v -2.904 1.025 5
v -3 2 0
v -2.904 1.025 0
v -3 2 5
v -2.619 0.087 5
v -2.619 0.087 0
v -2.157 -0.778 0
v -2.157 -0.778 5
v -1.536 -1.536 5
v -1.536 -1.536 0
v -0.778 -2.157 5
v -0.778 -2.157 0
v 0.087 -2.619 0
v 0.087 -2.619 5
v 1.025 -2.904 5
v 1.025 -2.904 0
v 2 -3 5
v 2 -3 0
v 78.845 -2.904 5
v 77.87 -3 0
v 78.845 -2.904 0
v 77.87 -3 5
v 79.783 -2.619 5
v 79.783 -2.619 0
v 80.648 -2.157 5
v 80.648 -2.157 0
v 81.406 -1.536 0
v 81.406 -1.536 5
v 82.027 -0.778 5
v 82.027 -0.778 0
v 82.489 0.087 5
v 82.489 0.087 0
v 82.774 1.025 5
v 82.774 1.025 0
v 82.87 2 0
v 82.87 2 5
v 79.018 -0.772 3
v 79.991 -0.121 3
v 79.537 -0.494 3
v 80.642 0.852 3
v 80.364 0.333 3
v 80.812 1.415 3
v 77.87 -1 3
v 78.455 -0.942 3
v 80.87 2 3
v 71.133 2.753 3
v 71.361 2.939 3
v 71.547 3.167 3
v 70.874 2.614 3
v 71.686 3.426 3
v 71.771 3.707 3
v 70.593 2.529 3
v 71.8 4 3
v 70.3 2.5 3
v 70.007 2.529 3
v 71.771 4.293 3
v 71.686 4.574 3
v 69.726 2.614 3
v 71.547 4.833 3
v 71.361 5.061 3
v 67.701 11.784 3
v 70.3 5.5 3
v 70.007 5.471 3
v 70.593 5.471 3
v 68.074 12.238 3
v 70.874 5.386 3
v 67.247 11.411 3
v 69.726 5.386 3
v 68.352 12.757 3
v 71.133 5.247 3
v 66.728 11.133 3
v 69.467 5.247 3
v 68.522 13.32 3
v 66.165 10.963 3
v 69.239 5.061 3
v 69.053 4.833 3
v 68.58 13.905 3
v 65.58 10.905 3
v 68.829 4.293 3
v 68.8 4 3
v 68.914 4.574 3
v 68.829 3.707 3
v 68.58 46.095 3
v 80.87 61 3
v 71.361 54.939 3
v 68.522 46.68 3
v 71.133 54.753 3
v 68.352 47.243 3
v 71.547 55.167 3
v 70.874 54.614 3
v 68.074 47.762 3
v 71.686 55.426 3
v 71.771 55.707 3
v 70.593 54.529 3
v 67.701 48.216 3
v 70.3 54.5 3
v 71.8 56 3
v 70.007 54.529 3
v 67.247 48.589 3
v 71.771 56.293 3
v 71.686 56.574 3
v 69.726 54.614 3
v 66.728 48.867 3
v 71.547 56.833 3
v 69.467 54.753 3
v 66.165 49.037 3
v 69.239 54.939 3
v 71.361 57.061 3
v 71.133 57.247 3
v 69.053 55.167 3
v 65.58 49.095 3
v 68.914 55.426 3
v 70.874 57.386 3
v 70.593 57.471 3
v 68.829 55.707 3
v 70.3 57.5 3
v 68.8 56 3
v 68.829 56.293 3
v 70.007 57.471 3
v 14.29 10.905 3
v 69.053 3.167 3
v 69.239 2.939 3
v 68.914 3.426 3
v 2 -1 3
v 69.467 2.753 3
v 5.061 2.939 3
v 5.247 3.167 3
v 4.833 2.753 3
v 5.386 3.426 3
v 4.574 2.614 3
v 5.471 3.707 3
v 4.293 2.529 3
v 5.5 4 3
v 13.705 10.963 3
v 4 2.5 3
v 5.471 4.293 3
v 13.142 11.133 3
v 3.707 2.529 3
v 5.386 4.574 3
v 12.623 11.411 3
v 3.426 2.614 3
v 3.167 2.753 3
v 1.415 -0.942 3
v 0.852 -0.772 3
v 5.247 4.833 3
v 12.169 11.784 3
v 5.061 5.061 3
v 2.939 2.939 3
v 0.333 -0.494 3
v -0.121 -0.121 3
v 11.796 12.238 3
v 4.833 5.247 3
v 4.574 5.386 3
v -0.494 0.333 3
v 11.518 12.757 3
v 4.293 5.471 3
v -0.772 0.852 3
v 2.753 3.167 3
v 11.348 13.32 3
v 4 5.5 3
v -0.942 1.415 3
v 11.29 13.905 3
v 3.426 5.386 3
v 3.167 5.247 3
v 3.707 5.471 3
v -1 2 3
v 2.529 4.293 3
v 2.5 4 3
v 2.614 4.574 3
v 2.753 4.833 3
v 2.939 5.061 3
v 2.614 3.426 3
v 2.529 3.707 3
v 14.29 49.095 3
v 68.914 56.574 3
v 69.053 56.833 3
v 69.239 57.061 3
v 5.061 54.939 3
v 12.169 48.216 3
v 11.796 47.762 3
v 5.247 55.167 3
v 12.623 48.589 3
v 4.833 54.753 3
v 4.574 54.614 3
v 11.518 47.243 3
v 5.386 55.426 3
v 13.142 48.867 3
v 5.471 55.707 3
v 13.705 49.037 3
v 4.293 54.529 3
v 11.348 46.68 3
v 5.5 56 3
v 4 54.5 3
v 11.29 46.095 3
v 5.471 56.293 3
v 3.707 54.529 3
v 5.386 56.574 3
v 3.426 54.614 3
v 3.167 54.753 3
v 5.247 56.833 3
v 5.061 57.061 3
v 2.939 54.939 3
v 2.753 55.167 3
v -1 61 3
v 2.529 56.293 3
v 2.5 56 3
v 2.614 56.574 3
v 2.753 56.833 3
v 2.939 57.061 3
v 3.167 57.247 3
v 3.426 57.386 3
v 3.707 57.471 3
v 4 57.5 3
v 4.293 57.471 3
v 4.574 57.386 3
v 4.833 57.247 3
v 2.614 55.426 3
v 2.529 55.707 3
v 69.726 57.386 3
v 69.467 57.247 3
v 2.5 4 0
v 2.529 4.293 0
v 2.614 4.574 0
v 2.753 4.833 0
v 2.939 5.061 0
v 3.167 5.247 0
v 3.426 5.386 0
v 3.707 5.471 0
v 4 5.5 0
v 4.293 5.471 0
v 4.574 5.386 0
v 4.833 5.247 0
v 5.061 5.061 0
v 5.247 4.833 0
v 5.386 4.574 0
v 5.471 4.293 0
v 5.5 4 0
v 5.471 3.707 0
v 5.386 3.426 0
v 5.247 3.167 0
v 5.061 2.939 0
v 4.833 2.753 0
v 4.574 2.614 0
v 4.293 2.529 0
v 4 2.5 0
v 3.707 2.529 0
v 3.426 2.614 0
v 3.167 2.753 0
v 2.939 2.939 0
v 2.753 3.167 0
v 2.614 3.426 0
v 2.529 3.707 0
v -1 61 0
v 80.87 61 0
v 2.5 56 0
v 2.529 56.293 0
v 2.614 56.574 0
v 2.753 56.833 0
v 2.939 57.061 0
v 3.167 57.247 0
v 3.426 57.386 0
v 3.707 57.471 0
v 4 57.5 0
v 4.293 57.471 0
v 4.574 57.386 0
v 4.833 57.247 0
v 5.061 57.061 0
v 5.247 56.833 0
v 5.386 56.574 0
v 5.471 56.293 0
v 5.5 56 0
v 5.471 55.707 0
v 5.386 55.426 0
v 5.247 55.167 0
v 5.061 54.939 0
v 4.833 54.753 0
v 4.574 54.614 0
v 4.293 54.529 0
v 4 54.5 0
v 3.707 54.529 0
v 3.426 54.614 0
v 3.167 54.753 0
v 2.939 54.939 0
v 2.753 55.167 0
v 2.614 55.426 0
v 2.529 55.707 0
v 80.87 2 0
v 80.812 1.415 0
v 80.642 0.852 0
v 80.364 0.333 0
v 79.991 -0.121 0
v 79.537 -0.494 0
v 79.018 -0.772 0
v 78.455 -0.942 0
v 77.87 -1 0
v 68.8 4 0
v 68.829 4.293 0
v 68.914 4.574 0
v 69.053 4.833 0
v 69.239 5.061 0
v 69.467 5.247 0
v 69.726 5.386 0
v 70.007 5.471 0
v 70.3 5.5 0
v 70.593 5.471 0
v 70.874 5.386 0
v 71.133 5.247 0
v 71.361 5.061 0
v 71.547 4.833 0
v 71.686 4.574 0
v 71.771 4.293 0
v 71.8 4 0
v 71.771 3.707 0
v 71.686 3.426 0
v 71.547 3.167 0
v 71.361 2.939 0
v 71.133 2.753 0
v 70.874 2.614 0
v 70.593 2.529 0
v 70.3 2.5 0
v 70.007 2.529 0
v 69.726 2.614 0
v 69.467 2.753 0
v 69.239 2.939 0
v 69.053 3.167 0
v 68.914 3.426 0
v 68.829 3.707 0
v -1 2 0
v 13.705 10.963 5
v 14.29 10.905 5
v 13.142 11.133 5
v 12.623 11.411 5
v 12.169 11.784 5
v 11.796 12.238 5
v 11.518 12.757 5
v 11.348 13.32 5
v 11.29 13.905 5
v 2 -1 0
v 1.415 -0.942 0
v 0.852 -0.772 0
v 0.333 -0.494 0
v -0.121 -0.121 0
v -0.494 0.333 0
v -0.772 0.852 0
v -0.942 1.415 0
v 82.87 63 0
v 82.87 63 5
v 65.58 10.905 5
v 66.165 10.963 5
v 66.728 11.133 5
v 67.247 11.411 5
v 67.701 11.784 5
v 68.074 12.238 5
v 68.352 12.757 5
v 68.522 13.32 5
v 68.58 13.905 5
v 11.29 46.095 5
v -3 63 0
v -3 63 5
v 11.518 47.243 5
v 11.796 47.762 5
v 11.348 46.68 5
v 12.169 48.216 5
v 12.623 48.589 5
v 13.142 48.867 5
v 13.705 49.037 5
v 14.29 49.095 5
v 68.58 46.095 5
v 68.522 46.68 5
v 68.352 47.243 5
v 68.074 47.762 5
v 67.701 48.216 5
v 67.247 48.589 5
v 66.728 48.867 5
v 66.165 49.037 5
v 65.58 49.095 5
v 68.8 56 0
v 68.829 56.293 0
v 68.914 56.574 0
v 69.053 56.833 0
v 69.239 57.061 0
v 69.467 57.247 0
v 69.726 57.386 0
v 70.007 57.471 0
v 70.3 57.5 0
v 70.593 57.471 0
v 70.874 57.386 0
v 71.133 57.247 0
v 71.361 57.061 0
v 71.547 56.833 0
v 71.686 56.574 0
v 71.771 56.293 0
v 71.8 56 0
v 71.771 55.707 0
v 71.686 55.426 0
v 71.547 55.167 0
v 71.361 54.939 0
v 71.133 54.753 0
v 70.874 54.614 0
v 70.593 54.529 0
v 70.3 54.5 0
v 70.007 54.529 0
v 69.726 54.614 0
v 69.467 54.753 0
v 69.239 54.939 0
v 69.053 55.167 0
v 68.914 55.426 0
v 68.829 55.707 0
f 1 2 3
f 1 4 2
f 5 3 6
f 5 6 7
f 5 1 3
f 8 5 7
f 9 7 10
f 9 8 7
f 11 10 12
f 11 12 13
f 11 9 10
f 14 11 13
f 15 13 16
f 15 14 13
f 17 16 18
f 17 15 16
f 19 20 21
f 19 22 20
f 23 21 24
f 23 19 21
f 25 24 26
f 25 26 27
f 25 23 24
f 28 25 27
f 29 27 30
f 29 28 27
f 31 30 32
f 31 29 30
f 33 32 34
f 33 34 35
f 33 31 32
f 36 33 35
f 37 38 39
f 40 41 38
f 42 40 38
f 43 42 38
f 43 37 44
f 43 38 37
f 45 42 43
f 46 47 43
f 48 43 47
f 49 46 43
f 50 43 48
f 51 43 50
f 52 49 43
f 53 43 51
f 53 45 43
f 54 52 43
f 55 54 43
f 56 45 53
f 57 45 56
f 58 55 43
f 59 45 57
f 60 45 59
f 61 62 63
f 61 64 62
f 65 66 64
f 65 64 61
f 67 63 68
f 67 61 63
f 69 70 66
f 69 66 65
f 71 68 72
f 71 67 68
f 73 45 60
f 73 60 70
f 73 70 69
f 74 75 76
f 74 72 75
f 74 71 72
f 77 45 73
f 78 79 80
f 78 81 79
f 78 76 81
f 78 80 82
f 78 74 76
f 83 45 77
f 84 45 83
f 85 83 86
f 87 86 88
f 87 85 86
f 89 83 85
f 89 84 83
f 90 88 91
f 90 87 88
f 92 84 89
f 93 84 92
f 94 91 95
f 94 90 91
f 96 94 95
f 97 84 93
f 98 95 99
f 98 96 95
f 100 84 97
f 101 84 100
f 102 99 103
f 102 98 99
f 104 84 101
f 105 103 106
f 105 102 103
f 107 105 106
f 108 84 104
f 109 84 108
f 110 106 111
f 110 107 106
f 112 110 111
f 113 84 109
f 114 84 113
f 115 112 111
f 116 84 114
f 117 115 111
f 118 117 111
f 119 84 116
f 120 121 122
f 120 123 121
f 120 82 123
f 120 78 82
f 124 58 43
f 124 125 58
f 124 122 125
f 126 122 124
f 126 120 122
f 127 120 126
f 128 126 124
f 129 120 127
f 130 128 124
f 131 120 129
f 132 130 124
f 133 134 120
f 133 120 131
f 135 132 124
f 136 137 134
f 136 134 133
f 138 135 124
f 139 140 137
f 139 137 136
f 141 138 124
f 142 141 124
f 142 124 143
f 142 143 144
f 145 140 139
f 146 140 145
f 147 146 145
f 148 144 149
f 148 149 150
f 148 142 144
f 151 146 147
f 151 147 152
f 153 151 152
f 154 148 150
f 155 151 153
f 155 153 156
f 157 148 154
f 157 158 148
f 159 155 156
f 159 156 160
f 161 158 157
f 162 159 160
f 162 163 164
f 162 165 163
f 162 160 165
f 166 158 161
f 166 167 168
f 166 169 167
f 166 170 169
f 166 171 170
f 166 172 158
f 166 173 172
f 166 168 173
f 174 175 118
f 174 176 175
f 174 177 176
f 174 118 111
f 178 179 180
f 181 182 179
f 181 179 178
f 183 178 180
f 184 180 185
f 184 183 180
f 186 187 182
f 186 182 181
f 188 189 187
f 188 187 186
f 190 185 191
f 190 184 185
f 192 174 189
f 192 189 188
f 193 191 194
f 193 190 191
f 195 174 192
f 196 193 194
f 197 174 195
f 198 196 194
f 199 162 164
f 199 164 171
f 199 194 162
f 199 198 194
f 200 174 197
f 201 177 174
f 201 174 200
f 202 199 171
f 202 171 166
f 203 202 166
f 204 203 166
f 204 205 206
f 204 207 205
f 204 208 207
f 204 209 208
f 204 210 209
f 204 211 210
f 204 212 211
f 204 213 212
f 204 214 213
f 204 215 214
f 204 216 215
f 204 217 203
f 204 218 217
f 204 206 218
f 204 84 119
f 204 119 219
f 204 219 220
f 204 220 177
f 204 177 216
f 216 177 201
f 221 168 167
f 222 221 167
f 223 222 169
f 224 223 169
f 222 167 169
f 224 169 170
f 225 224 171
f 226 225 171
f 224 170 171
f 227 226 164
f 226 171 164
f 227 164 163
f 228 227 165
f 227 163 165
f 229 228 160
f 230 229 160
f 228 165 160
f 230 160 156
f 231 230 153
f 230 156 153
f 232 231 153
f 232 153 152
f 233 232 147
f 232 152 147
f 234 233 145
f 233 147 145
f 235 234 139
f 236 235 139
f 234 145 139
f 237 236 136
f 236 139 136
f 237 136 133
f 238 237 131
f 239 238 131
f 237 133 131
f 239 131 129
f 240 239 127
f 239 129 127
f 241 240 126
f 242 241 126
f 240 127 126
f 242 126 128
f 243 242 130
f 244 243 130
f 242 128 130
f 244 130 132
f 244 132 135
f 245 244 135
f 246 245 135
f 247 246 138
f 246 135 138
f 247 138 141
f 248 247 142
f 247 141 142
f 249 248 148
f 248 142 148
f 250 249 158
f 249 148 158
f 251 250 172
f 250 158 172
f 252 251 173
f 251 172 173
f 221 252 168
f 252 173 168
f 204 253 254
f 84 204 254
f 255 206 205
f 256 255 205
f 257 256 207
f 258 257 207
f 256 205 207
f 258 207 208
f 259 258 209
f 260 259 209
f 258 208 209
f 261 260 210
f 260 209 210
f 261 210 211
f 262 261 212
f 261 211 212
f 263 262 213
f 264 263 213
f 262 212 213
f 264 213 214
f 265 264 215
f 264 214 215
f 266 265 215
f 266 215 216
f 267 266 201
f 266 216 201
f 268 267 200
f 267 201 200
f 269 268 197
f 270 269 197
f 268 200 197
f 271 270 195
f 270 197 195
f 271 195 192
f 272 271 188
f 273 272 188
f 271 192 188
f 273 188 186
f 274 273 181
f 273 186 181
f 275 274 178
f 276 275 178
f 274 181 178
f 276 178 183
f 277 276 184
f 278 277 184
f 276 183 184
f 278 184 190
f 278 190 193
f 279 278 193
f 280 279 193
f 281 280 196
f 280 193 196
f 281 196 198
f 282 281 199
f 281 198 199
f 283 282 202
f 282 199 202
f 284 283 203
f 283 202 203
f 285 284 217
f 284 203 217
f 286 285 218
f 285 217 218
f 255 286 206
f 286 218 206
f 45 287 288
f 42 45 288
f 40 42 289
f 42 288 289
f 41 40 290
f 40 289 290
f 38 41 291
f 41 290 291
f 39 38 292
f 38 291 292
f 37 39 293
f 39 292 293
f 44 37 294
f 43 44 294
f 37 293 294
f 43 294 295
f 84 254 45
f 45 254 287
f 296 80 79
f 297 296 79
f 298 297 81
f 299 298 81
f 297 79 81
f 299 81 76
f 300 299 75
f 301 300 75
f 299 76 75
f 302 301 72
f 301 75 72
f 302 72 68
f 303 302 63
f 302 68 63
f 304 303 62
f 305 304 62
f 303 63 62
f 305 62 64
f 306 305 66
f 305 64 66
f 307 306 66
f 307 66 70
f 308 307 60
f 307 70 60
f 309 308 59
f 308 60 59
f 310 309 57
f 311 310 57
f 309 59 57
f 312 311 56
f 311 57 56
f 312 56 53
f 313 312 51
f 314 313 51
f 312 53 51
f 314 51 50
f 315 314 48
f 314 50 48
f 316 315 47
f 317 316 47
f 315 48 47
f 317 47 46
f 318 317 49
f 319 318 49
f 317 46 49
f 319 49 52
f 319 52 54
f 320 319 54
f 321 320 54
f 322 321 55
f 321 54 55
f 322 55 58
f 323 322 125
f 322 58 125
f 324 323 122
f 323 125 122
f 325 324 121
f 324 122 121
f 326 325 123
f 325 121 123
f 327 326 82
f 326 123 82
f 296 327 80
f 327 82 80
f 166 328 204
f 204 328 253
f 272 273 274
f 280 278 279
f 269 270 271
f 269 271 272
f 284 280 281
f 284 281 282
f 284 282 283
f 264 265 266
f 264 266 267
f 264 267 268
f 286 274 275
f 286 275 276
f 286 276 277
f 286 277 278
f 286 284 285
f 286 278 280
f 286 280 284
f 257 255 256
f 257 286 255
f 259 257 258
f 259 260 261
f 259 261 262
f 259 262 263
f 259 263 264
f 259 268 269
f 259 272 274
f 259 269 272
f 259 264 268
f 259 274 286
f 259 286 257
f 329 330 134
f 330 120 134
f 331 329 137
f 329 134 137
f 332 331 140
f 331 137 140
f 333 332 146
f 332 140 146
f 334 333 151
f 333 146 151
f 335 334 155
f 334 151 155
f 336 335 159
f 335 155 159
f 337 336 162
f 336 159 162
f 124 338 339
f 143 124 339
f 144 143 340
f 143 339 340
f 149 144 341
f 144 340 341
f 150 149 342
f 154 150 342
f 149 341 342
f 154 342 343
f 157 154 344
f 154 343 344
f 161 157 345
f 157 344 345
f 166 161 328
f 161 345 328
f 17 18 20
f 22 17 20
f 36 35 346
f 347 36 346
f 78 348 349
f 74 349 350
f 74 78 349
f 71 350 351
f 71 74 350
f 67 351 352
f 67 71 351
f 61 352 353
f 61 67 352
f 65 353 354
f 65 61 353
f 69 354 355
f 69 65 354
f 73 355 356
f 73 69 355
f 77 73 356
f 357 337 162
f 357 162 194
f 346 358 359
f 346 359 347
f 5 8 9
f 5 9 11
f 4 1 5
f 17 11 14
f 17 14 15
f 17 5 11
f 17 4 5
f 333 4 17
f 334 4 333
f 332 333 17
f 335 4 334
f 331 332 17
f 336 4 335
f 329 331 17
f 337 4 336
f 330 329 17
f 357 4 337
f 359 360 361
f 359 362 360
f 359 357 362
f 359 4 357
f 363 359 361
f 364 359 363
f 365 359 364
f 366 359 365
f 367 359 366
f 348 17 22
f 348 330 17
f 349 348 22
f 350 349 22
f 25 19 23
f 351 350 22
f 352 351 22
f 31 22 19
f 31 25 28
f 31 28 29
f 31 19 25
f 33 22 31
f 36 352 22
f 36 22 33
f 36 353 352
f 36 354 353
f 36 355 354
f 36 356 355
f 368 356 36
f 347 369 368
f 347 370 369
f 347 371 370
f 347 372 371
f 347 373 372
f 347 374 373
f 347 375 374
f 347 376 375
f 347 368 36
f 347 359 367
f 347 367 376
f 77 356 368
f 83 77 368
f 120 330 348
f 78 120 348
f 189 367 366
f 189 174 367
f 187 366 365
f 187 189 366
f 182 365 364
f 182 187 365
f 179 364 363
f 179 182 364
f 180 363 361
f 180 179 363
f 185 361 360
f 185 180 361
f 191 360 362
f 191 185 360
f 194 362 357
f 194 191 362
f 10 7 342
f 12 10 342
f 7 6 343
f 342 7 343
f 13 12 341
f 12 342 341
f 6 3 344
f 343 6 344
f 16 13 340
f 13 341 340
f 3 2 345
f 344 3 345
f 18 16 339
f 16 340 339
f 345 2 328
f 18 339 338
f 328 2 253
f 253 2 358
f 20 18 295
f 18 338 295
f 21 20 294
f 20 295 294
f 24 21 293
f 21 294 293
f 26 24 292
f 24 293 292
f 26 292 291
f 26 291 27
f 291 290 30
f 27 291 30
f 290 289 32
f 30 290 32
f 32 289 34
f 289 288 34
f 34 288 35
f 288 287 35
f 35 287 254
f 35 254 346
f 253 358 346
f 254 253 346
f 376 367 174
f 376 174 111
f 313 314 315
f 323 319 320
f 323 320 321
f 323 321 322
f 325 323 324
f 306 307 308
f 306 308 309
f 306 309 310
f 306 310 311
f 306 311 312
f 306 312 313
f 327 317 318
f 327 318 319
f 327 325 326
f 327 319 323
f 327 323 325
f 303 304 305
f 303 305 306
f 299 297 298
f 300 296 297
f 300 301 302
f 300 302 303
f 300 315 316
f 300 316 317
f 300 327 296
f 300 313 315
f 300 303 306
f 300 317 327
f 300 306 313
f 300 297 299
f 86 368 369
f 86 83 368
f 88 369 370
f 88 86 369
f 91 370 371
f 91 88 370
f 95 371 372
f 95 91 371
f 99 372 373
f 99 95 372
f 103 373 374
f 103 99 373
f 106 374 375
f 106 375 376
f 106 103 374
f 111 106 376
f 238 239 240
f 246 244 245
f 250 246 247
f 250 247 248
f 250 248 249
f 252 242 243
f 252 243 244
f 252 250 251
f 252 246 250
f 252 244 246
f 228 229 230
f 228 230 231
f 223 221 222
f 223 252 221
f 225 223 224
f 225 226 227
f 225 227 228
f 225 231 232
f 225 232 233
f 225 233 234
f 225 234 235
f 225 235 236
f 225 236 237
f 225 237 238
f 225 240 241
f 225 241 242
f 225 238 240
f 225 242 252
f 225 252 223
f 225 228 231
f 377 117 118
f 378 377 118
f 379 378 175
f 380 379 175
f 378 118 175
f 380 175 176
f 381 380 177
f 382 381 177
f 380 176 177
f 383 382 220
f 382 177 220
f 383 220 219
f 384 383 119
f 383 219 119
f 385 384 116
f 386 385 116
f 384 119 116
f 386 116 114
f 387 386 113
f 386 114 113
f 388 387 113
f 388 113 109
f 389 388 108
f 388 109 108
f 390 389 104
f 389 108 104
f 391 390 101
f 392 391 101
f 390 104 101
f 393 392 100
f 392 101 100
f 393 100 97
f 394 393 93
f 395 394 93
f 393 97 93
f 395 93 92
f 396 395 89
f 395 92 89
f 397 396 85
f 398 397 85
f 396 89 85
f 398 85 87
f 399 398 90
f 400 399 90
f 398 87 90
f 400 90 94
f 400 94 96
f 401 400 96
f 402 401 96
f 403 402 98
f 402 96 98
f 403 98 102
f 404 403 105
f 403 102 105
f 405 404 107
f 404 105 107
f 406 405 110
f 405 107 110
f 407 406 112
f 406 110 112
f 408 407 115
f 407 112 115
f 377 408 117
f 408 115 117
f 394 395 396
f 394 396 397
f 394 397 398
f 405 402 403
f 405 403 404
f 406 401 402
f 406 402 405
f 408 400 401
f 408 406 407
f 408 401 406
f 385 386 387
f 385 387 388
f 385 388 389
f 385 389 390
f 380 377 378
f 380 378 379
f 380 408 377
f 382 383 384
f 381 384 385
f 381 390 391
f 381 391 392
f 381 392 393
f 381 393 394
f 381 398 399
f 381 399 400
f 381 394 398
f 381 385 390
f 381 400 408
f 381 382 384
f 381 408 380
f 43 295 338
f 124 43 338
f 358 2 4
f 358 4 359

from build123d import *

# Parameters (mm, degrees)
SKETCH1_W           = 85.87
SKETCH1_H           = 66
BOSS_EXTRUDE2_DEPTH = 5
FILLET1_R           = 5
CUT_EXTRUDE2_DEPTH  = 3
CUT_EXTRUDE1_REACH  = 7
SKETCH2_W           = 57.29
SKETCH2_H           = 38.19
FILLET2_R           = 3
SKETCH3_R           = 1.5
BOSS_EXTRUDE3_DEPTH = 3


with BuildPart() as part:
    # Sketch1 → Boss-Extrude2 (new body)
    with BuildSketch(Plane.XY):
        with Locations((39.935, 30)):
            Rectangle(SKETCH1_W, SKETCH1_H)
    extrude(amount=BOSS_EXTRUDE2_DEPTH)

    # Fillet1
    fillet1_edges = [part.edges().sort_by_distance(p)[0] for p in [
        (82.87, -3, 2.5),
        (-3, -3, 2.5),
    ]]
    fillet(fillet1_edges, radius=FILLET1_R)

    # Sketch4 → Cut-Extrude2 (cut)
    with BuildSketch(Plane(origin=(0, 0, 0), x_dir=(-1, 0, 0), z_dir=(0, 0, -1))):
        with BuildLine():
            Line((-80.87, 61), (-80.87, 2))
            ThreePointArc((-80.87, 2), (-79.991320344, -0.121320344), (-77.87, -1))
            Line((-77.87, -1), (-2, -1))
            ThreePointArc((-2, -1), (0.121320344, -0.121320344), (1, 2))
            Line((1, 2), (1, 61))
            Line((1, 61), (-80.87, 61))
        make_face()
    extrude(amount=-CUT_EXTRUDE2_DEPTH, mode=Mode.SUBTRACT)

    # Sketch2 → Cut-Extrude1 (cut, up to next)
    with BuildSketch(Plane.XY.offset(5), mode=Mode.PRIVATE) as cut_extrude1_sk1:
        with Locations((39.935, 30)):
            Rectangle(SKETCH2_W, SKETCH2_H)
    cut_extrude1_tool1 = extrude(cut_extrude1_sk1.sketch, amount=-CUT_EXTRUDE1_REACH, mode=Mode.PRIVATE) & part.part
    add(cut_extrude1_tool1.solids().sort_by_distance((39.935, 30, 5))[0], mode=Mode.SUBTRACT)

    # Fillet2
    fillet2_edges = [part.edges().sort_by_distance(p)[0] for p in [
        (11.29, 10.905, 4),
        (11.29, 49.095, 4),
        (68.58, 49.095, 4),
        (68.58, 10.905, 4),
    ]]
    fillet(fillet2_edges, radius=FILLET2_R)

    # Sketch3 → Boss-Extrude3 (add)
    with BuildSketch(Plane(origin=(0, 0, 3), x_dir=(-1, 0, 0), z_dir=(0, 0, -1))):
        with Locations((-4, 4)):
            Circle(SKETCH3_R)
        with Locations((-4, 56)):
            Circle(SKETCH3_R)
        with Locations((-70.3, 56)):
            Circle(SKETCH3_R)
        with Locations((-70.3, 4)):
            Circle(SKETCH3_R)
    extrude(amount=BOSS_EXTRUDE3_DEPTH)


solid = part.part
